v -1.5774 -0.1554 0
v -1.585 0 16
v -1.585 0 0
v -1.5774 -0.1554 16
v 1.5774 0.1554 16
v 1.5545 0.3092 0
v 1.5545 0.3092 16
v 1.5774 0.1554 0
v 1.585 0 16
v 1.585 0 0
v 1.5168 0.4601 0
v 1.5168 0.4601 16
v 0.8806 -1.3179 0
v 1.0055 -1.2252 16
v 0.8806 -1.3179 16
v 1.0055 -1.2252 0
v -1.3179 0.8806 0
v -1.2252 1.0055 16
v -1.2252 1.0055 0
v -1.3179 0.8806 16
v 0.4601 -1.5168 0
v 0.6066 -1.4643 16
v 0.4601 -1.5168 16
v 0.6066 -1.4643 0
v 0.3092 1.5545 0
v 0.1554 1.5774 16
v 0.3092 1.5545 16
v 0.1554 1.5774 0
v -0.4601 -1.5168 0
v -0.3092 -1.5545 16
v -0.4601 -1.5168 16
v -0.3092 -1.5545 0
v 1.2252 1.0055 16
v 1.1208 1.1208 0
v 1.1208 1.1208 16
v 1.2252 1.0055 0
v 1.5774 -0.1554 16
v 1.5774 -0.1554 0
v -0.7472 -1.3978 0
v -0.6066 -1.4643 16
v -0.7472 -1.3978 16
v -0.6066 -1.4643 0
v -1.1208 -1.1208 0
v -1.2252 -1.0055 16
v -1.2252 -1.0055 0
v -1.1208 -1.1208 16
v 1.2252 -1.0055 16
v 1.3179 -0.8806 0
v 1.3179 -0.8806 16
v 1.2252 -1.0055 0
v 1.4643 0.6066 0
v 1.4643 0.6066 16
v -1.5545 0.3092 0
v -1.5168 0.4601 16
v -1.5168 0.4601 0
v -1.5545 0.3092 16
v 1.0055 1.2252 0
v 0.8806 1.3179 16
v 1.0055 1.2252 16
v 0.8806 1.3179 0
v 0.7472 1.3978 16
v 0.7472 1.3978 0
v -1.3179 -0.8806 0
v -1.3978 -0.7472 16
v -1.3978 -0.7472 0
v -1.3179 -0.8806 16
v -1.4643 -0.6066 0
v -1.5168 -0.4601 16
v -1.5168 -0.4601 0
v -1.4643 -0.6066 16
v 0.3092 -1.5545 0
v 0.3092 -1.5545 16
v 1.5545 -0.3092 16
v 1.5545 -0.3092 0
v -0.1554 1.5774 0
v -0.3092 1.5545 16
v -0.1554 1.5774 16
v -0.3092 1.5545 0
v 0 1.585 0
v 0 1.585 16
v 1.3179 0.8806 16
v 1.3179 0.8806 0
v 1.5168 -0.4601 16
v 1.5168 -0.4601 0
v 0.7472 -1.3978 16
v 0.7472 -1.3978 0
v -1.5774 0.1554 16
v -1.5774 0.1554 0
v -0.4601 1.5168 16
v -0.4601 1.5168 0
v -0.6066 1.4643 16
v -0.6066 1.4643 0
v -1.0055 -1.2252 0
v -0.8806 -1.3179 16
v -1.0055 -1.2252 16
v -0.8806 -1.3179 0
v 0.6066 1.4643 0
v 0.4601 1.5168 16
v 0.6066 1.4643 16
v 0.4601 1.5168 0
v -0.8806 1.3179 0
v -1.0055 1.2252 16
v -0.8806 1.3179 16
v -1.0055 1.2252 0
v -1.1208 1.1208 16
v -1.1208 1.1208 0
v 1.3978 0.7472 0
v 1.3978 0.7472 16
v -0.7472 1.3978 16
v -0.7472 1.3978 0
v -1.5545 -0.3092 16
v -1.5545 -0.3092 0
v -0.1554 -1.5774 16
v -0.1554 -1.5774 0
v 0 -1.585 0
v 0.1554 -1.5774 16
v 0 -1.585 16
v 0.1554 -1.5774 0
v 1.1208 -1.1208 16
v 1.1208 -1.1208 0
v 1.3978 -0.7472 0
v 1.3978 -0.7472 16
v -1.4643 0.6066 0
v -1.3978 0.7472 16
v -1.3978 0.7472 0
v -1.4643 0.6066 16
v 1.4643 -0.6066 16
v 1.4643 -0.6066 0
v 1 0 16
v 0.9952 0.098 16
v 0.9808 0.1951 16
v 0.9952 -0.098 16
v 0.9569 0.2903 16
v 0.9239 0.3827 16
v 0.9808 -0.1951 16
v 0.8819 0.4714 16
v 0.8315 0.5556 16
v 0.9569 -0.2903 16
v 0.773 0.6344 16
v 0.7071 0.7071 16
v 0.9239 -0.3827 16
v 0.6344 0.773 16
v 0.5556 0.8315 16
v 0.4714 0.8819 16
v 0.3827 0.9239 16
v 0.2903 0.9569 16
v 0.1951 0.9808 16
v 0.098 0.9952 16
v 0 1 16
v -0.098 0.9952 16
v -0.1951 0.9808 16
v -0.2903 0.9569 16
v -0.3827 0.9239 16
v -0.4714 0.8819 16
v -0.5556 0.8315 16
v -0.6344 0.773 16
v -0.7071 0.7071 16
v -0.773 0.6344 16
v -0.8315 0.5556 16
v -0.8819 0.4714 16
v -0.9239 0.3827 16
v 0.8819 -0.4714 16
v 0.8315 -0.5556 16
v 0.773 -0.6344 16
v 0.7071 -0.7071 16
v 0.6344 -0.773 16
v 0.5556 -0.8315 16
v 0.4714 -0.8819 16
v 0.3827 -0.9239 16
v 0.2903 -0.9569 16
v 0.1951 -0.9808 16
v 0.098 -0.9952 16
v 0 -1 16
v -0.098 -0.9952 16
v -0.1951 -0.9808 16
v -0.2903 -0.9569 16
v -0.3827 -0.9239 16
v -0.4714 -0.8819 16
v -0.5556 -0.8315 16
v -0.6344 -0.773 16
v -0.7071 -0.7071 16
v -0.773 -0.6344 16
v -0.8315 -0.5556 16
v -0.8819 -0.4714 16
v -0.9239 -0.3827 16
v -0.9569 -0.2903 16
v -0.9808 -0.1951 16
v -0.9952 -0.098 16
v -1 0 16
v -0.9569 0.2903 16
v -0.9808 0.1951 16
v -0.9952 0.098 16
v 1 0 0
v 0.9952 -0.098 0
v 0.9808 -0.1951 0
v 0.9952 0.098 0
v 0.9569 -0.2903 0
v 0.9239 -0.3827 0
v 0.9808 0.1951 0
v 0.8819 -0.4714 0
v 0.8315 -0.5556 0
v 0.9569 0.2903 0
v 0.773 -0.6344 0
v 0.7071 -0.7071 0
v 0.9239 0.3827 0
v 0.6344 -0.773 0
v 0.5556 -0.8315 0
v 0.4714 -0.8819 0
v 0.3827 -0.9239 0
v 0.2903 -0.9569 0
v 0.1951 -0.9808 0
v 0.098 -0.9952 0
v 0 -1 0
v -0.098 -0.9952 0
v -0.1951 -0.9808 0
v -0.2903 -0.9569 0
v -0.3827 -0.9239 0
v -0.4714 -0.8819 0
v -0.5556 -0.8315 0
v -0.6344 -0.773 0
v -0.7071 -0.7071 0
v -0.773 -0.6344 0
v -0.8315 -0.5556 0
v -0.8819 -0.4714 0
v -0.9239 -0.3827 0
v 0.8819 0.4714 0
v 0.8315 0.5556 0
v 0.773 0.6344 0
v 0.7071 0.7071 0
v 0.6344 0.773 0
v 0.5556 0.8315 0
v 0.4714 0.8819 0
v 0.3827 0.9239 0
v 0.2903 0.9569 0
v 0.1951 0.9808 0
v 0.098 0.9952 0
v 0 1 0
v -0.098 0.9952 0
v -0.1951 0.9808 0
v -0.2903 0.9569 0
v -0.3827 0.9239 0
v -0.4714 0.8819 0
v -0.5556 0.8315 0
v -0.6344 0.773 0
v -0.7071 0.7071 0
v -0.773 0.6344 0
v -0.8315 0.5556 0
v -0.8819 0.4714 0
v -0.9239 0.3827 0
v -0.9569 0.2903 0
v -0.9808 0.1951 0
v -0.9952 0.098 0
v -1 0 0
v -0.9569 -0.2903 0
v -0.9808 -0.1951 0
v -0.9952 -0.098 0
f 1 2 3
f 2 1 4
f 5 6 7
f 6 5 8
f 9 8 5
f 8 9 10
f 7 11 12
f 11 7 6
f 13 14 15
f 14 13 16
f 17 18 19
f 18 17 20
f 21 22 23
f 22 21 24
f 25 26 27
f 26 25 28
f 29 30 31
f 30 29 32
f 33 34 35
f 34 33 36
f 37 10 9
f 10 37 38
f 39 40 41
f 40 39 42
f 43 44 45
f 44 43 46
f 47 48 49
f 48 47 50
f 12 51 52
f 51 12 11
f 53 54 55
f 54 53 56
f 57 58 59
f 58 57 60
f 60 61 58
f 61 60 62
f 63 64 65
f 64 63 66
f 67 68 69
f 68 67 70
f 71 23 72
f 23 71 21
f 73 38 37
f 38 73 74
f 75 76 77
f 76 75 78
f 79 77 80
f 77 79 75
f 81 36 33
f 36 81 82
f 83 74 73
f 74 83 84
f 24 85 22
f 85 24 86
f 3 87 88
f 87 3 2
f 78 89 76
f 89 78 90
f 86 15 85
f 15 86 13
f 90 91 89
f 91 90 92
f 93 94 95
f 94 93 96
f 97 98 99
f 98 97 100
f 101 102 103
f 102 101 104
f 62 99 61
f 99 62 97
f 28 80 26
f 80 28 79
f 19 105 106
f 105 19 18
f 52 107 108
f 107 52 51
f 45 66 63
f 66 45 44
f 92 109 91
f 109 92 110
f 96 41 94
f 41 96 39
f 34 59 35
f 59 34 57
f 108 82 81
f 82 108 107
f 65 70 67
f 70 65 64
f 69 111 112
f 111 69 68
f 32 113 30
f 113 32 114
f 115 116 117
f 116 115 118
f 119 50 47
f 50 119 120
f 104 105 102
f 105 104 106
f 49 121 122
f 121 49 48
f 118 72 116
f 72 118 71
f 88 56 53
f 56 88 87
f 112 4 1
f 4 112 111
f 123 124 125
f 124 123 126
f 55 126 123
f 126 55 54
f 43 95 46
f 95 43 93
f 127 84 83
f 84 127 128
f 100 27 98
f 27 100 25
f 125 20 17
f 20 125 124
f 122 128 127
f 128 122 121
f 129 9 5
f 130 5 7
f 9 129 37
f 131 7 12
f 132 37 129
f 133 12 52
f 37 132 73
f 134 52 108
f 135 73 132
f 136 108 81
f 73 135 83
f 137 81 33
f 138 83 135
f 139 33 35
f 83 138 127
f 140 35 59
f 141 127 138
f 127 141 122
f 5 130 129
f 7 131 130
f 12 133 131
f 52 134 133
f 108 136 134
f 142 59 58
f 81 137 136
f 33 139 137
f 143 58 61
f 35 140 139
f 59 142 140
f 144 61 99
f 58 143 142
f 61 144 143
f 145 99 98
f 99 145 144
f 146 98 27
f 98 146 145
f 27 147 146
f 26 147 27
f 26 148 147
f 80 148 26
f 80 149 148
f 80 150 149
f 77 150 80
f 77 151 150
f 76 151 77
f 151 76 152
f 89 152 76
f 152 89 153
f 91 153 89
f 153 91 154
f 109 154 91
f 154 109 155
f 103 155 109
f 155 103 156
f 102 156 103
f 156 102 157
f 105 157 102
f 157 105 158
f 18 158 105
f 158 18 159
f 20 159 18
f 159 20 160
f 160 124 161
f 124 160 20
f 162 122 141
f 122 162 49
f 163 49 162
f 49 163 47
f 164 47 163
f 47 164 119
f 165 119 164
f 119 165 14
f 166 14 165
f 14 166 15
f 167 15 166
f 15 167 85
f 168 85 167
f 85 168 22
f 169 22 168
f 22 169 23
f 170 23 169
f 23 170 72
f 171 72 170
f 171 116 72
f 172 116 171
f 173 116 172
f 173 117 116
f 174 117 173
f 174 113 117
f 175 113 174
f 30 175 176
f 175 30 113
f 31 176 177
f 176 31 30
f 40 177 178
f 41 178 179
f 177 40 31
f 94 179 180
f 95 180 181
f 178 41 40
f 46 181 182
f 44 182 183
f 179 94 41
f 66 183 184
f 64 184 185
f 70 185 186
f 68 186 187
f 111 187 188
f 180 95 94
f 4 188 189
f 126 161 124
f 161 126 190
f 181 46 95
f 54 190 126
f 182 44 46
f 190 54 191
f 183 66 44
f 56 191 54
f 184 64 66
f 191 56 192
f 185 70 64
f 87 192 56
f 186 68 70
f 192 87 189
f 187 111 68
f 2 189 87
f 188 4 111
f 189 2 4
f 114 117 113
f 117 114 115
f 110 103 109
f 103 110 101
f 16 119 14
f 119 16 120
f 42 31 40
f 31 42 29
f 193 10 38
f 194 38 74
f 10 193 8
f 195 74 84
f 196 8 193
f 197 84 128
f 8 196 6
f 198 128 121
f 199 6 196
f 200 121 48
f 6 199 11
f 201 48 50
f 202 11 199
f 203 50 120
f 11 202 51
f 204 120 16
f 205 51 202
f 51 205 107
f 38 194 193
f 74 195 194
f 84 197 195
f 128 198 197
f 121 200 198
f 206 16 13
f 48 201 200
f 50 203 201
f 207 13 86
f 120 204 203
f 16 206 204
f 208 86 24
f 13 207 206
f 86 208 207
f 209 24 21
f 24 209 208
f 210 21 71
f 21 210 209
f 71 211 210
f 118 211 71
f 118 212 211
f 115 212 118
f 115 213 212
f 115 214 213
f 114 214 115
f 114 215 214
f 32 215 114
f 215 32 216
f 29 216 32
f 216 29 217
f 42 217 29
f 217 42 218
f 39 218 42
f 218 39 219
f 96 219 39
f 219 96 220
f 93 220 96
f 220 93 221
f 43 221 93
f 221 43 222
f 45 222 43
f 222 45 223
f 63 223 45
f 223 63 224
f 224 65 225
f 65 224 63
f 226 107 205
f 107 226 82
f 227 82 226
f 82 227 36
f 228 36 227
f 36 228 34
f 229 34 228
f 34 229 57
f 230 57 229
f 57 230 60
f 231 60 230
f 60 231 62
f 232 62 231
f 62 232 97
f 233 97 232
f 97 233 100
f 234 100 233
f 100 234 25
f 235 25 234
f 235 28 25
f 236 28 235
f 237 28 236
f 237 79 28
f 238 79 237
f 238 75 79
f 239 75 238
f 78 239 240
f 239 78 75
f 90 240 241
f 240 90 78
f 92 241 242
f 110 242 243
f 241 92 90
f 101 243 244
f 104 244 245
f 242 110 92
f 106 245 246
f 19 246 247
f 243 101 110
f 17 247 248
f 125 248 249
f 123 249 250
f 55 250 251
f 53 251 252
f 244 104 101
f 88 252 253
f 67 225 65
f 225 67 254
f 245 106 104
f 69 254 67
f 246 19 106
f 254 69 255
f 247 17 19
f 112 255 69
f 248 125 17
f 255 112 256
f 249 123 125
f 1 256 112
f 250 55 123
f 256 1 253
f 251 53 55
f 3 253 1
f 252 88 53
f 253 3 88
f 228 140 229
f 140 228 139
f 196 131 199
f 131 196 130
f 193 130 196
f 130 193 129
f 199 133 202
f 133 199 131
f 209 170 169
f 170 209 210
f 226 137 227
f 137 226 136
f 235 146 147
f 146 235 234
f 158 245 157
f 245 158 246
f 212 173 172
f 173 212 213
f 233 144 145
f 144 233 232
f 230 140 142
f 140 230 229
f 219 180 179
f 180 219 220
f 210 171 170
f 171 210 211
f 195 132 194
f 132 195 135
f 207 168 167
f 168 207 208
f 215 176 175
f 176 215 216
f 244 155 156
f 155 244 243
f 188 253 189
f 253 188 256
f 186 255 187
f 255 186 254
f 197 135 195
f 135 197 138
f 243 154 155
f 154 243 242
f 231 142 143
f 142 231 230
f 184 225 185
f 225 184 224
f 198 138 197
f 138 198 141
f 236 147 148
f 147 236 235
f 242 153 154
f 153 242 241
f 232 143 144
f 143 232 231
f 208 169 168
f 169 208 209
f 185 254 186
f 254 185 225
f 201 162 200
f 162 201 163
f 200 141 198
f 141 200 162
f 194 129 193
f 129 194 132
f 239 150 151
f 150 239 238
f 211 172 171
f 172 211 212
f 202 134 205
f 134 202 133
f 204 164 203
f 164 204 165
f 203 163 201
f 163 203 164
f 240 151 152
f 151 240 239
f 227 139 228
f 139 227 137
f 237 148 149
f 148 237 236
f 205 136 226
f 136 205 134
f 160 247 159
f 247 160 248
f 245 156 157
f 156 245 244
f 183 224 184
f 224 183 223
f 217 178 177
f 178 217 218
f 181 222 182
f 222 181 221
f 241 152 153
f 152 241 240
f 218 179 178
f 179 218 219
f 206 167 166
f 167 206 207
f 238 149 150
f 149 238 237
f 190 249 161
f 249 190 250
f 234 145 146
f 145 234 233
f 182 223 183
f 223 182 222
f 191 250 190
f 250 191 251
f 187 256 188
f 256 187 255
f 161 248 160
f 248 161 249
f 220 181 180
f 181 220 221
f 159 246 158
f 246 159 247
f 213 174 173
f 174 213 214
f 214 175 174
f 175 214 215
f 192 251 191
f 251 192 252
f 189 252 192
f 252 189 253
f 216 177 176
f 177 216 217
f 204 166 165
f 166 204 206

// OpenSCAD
module standoff_pillar() {
    difference() {
        cylinder(h=16.0, d=3.17, $fn=64);
        translate([0, 0, -1])
            cylinder(h=18.0, d=2.0, $fn=64);
    }
}

standoff_pillar();
